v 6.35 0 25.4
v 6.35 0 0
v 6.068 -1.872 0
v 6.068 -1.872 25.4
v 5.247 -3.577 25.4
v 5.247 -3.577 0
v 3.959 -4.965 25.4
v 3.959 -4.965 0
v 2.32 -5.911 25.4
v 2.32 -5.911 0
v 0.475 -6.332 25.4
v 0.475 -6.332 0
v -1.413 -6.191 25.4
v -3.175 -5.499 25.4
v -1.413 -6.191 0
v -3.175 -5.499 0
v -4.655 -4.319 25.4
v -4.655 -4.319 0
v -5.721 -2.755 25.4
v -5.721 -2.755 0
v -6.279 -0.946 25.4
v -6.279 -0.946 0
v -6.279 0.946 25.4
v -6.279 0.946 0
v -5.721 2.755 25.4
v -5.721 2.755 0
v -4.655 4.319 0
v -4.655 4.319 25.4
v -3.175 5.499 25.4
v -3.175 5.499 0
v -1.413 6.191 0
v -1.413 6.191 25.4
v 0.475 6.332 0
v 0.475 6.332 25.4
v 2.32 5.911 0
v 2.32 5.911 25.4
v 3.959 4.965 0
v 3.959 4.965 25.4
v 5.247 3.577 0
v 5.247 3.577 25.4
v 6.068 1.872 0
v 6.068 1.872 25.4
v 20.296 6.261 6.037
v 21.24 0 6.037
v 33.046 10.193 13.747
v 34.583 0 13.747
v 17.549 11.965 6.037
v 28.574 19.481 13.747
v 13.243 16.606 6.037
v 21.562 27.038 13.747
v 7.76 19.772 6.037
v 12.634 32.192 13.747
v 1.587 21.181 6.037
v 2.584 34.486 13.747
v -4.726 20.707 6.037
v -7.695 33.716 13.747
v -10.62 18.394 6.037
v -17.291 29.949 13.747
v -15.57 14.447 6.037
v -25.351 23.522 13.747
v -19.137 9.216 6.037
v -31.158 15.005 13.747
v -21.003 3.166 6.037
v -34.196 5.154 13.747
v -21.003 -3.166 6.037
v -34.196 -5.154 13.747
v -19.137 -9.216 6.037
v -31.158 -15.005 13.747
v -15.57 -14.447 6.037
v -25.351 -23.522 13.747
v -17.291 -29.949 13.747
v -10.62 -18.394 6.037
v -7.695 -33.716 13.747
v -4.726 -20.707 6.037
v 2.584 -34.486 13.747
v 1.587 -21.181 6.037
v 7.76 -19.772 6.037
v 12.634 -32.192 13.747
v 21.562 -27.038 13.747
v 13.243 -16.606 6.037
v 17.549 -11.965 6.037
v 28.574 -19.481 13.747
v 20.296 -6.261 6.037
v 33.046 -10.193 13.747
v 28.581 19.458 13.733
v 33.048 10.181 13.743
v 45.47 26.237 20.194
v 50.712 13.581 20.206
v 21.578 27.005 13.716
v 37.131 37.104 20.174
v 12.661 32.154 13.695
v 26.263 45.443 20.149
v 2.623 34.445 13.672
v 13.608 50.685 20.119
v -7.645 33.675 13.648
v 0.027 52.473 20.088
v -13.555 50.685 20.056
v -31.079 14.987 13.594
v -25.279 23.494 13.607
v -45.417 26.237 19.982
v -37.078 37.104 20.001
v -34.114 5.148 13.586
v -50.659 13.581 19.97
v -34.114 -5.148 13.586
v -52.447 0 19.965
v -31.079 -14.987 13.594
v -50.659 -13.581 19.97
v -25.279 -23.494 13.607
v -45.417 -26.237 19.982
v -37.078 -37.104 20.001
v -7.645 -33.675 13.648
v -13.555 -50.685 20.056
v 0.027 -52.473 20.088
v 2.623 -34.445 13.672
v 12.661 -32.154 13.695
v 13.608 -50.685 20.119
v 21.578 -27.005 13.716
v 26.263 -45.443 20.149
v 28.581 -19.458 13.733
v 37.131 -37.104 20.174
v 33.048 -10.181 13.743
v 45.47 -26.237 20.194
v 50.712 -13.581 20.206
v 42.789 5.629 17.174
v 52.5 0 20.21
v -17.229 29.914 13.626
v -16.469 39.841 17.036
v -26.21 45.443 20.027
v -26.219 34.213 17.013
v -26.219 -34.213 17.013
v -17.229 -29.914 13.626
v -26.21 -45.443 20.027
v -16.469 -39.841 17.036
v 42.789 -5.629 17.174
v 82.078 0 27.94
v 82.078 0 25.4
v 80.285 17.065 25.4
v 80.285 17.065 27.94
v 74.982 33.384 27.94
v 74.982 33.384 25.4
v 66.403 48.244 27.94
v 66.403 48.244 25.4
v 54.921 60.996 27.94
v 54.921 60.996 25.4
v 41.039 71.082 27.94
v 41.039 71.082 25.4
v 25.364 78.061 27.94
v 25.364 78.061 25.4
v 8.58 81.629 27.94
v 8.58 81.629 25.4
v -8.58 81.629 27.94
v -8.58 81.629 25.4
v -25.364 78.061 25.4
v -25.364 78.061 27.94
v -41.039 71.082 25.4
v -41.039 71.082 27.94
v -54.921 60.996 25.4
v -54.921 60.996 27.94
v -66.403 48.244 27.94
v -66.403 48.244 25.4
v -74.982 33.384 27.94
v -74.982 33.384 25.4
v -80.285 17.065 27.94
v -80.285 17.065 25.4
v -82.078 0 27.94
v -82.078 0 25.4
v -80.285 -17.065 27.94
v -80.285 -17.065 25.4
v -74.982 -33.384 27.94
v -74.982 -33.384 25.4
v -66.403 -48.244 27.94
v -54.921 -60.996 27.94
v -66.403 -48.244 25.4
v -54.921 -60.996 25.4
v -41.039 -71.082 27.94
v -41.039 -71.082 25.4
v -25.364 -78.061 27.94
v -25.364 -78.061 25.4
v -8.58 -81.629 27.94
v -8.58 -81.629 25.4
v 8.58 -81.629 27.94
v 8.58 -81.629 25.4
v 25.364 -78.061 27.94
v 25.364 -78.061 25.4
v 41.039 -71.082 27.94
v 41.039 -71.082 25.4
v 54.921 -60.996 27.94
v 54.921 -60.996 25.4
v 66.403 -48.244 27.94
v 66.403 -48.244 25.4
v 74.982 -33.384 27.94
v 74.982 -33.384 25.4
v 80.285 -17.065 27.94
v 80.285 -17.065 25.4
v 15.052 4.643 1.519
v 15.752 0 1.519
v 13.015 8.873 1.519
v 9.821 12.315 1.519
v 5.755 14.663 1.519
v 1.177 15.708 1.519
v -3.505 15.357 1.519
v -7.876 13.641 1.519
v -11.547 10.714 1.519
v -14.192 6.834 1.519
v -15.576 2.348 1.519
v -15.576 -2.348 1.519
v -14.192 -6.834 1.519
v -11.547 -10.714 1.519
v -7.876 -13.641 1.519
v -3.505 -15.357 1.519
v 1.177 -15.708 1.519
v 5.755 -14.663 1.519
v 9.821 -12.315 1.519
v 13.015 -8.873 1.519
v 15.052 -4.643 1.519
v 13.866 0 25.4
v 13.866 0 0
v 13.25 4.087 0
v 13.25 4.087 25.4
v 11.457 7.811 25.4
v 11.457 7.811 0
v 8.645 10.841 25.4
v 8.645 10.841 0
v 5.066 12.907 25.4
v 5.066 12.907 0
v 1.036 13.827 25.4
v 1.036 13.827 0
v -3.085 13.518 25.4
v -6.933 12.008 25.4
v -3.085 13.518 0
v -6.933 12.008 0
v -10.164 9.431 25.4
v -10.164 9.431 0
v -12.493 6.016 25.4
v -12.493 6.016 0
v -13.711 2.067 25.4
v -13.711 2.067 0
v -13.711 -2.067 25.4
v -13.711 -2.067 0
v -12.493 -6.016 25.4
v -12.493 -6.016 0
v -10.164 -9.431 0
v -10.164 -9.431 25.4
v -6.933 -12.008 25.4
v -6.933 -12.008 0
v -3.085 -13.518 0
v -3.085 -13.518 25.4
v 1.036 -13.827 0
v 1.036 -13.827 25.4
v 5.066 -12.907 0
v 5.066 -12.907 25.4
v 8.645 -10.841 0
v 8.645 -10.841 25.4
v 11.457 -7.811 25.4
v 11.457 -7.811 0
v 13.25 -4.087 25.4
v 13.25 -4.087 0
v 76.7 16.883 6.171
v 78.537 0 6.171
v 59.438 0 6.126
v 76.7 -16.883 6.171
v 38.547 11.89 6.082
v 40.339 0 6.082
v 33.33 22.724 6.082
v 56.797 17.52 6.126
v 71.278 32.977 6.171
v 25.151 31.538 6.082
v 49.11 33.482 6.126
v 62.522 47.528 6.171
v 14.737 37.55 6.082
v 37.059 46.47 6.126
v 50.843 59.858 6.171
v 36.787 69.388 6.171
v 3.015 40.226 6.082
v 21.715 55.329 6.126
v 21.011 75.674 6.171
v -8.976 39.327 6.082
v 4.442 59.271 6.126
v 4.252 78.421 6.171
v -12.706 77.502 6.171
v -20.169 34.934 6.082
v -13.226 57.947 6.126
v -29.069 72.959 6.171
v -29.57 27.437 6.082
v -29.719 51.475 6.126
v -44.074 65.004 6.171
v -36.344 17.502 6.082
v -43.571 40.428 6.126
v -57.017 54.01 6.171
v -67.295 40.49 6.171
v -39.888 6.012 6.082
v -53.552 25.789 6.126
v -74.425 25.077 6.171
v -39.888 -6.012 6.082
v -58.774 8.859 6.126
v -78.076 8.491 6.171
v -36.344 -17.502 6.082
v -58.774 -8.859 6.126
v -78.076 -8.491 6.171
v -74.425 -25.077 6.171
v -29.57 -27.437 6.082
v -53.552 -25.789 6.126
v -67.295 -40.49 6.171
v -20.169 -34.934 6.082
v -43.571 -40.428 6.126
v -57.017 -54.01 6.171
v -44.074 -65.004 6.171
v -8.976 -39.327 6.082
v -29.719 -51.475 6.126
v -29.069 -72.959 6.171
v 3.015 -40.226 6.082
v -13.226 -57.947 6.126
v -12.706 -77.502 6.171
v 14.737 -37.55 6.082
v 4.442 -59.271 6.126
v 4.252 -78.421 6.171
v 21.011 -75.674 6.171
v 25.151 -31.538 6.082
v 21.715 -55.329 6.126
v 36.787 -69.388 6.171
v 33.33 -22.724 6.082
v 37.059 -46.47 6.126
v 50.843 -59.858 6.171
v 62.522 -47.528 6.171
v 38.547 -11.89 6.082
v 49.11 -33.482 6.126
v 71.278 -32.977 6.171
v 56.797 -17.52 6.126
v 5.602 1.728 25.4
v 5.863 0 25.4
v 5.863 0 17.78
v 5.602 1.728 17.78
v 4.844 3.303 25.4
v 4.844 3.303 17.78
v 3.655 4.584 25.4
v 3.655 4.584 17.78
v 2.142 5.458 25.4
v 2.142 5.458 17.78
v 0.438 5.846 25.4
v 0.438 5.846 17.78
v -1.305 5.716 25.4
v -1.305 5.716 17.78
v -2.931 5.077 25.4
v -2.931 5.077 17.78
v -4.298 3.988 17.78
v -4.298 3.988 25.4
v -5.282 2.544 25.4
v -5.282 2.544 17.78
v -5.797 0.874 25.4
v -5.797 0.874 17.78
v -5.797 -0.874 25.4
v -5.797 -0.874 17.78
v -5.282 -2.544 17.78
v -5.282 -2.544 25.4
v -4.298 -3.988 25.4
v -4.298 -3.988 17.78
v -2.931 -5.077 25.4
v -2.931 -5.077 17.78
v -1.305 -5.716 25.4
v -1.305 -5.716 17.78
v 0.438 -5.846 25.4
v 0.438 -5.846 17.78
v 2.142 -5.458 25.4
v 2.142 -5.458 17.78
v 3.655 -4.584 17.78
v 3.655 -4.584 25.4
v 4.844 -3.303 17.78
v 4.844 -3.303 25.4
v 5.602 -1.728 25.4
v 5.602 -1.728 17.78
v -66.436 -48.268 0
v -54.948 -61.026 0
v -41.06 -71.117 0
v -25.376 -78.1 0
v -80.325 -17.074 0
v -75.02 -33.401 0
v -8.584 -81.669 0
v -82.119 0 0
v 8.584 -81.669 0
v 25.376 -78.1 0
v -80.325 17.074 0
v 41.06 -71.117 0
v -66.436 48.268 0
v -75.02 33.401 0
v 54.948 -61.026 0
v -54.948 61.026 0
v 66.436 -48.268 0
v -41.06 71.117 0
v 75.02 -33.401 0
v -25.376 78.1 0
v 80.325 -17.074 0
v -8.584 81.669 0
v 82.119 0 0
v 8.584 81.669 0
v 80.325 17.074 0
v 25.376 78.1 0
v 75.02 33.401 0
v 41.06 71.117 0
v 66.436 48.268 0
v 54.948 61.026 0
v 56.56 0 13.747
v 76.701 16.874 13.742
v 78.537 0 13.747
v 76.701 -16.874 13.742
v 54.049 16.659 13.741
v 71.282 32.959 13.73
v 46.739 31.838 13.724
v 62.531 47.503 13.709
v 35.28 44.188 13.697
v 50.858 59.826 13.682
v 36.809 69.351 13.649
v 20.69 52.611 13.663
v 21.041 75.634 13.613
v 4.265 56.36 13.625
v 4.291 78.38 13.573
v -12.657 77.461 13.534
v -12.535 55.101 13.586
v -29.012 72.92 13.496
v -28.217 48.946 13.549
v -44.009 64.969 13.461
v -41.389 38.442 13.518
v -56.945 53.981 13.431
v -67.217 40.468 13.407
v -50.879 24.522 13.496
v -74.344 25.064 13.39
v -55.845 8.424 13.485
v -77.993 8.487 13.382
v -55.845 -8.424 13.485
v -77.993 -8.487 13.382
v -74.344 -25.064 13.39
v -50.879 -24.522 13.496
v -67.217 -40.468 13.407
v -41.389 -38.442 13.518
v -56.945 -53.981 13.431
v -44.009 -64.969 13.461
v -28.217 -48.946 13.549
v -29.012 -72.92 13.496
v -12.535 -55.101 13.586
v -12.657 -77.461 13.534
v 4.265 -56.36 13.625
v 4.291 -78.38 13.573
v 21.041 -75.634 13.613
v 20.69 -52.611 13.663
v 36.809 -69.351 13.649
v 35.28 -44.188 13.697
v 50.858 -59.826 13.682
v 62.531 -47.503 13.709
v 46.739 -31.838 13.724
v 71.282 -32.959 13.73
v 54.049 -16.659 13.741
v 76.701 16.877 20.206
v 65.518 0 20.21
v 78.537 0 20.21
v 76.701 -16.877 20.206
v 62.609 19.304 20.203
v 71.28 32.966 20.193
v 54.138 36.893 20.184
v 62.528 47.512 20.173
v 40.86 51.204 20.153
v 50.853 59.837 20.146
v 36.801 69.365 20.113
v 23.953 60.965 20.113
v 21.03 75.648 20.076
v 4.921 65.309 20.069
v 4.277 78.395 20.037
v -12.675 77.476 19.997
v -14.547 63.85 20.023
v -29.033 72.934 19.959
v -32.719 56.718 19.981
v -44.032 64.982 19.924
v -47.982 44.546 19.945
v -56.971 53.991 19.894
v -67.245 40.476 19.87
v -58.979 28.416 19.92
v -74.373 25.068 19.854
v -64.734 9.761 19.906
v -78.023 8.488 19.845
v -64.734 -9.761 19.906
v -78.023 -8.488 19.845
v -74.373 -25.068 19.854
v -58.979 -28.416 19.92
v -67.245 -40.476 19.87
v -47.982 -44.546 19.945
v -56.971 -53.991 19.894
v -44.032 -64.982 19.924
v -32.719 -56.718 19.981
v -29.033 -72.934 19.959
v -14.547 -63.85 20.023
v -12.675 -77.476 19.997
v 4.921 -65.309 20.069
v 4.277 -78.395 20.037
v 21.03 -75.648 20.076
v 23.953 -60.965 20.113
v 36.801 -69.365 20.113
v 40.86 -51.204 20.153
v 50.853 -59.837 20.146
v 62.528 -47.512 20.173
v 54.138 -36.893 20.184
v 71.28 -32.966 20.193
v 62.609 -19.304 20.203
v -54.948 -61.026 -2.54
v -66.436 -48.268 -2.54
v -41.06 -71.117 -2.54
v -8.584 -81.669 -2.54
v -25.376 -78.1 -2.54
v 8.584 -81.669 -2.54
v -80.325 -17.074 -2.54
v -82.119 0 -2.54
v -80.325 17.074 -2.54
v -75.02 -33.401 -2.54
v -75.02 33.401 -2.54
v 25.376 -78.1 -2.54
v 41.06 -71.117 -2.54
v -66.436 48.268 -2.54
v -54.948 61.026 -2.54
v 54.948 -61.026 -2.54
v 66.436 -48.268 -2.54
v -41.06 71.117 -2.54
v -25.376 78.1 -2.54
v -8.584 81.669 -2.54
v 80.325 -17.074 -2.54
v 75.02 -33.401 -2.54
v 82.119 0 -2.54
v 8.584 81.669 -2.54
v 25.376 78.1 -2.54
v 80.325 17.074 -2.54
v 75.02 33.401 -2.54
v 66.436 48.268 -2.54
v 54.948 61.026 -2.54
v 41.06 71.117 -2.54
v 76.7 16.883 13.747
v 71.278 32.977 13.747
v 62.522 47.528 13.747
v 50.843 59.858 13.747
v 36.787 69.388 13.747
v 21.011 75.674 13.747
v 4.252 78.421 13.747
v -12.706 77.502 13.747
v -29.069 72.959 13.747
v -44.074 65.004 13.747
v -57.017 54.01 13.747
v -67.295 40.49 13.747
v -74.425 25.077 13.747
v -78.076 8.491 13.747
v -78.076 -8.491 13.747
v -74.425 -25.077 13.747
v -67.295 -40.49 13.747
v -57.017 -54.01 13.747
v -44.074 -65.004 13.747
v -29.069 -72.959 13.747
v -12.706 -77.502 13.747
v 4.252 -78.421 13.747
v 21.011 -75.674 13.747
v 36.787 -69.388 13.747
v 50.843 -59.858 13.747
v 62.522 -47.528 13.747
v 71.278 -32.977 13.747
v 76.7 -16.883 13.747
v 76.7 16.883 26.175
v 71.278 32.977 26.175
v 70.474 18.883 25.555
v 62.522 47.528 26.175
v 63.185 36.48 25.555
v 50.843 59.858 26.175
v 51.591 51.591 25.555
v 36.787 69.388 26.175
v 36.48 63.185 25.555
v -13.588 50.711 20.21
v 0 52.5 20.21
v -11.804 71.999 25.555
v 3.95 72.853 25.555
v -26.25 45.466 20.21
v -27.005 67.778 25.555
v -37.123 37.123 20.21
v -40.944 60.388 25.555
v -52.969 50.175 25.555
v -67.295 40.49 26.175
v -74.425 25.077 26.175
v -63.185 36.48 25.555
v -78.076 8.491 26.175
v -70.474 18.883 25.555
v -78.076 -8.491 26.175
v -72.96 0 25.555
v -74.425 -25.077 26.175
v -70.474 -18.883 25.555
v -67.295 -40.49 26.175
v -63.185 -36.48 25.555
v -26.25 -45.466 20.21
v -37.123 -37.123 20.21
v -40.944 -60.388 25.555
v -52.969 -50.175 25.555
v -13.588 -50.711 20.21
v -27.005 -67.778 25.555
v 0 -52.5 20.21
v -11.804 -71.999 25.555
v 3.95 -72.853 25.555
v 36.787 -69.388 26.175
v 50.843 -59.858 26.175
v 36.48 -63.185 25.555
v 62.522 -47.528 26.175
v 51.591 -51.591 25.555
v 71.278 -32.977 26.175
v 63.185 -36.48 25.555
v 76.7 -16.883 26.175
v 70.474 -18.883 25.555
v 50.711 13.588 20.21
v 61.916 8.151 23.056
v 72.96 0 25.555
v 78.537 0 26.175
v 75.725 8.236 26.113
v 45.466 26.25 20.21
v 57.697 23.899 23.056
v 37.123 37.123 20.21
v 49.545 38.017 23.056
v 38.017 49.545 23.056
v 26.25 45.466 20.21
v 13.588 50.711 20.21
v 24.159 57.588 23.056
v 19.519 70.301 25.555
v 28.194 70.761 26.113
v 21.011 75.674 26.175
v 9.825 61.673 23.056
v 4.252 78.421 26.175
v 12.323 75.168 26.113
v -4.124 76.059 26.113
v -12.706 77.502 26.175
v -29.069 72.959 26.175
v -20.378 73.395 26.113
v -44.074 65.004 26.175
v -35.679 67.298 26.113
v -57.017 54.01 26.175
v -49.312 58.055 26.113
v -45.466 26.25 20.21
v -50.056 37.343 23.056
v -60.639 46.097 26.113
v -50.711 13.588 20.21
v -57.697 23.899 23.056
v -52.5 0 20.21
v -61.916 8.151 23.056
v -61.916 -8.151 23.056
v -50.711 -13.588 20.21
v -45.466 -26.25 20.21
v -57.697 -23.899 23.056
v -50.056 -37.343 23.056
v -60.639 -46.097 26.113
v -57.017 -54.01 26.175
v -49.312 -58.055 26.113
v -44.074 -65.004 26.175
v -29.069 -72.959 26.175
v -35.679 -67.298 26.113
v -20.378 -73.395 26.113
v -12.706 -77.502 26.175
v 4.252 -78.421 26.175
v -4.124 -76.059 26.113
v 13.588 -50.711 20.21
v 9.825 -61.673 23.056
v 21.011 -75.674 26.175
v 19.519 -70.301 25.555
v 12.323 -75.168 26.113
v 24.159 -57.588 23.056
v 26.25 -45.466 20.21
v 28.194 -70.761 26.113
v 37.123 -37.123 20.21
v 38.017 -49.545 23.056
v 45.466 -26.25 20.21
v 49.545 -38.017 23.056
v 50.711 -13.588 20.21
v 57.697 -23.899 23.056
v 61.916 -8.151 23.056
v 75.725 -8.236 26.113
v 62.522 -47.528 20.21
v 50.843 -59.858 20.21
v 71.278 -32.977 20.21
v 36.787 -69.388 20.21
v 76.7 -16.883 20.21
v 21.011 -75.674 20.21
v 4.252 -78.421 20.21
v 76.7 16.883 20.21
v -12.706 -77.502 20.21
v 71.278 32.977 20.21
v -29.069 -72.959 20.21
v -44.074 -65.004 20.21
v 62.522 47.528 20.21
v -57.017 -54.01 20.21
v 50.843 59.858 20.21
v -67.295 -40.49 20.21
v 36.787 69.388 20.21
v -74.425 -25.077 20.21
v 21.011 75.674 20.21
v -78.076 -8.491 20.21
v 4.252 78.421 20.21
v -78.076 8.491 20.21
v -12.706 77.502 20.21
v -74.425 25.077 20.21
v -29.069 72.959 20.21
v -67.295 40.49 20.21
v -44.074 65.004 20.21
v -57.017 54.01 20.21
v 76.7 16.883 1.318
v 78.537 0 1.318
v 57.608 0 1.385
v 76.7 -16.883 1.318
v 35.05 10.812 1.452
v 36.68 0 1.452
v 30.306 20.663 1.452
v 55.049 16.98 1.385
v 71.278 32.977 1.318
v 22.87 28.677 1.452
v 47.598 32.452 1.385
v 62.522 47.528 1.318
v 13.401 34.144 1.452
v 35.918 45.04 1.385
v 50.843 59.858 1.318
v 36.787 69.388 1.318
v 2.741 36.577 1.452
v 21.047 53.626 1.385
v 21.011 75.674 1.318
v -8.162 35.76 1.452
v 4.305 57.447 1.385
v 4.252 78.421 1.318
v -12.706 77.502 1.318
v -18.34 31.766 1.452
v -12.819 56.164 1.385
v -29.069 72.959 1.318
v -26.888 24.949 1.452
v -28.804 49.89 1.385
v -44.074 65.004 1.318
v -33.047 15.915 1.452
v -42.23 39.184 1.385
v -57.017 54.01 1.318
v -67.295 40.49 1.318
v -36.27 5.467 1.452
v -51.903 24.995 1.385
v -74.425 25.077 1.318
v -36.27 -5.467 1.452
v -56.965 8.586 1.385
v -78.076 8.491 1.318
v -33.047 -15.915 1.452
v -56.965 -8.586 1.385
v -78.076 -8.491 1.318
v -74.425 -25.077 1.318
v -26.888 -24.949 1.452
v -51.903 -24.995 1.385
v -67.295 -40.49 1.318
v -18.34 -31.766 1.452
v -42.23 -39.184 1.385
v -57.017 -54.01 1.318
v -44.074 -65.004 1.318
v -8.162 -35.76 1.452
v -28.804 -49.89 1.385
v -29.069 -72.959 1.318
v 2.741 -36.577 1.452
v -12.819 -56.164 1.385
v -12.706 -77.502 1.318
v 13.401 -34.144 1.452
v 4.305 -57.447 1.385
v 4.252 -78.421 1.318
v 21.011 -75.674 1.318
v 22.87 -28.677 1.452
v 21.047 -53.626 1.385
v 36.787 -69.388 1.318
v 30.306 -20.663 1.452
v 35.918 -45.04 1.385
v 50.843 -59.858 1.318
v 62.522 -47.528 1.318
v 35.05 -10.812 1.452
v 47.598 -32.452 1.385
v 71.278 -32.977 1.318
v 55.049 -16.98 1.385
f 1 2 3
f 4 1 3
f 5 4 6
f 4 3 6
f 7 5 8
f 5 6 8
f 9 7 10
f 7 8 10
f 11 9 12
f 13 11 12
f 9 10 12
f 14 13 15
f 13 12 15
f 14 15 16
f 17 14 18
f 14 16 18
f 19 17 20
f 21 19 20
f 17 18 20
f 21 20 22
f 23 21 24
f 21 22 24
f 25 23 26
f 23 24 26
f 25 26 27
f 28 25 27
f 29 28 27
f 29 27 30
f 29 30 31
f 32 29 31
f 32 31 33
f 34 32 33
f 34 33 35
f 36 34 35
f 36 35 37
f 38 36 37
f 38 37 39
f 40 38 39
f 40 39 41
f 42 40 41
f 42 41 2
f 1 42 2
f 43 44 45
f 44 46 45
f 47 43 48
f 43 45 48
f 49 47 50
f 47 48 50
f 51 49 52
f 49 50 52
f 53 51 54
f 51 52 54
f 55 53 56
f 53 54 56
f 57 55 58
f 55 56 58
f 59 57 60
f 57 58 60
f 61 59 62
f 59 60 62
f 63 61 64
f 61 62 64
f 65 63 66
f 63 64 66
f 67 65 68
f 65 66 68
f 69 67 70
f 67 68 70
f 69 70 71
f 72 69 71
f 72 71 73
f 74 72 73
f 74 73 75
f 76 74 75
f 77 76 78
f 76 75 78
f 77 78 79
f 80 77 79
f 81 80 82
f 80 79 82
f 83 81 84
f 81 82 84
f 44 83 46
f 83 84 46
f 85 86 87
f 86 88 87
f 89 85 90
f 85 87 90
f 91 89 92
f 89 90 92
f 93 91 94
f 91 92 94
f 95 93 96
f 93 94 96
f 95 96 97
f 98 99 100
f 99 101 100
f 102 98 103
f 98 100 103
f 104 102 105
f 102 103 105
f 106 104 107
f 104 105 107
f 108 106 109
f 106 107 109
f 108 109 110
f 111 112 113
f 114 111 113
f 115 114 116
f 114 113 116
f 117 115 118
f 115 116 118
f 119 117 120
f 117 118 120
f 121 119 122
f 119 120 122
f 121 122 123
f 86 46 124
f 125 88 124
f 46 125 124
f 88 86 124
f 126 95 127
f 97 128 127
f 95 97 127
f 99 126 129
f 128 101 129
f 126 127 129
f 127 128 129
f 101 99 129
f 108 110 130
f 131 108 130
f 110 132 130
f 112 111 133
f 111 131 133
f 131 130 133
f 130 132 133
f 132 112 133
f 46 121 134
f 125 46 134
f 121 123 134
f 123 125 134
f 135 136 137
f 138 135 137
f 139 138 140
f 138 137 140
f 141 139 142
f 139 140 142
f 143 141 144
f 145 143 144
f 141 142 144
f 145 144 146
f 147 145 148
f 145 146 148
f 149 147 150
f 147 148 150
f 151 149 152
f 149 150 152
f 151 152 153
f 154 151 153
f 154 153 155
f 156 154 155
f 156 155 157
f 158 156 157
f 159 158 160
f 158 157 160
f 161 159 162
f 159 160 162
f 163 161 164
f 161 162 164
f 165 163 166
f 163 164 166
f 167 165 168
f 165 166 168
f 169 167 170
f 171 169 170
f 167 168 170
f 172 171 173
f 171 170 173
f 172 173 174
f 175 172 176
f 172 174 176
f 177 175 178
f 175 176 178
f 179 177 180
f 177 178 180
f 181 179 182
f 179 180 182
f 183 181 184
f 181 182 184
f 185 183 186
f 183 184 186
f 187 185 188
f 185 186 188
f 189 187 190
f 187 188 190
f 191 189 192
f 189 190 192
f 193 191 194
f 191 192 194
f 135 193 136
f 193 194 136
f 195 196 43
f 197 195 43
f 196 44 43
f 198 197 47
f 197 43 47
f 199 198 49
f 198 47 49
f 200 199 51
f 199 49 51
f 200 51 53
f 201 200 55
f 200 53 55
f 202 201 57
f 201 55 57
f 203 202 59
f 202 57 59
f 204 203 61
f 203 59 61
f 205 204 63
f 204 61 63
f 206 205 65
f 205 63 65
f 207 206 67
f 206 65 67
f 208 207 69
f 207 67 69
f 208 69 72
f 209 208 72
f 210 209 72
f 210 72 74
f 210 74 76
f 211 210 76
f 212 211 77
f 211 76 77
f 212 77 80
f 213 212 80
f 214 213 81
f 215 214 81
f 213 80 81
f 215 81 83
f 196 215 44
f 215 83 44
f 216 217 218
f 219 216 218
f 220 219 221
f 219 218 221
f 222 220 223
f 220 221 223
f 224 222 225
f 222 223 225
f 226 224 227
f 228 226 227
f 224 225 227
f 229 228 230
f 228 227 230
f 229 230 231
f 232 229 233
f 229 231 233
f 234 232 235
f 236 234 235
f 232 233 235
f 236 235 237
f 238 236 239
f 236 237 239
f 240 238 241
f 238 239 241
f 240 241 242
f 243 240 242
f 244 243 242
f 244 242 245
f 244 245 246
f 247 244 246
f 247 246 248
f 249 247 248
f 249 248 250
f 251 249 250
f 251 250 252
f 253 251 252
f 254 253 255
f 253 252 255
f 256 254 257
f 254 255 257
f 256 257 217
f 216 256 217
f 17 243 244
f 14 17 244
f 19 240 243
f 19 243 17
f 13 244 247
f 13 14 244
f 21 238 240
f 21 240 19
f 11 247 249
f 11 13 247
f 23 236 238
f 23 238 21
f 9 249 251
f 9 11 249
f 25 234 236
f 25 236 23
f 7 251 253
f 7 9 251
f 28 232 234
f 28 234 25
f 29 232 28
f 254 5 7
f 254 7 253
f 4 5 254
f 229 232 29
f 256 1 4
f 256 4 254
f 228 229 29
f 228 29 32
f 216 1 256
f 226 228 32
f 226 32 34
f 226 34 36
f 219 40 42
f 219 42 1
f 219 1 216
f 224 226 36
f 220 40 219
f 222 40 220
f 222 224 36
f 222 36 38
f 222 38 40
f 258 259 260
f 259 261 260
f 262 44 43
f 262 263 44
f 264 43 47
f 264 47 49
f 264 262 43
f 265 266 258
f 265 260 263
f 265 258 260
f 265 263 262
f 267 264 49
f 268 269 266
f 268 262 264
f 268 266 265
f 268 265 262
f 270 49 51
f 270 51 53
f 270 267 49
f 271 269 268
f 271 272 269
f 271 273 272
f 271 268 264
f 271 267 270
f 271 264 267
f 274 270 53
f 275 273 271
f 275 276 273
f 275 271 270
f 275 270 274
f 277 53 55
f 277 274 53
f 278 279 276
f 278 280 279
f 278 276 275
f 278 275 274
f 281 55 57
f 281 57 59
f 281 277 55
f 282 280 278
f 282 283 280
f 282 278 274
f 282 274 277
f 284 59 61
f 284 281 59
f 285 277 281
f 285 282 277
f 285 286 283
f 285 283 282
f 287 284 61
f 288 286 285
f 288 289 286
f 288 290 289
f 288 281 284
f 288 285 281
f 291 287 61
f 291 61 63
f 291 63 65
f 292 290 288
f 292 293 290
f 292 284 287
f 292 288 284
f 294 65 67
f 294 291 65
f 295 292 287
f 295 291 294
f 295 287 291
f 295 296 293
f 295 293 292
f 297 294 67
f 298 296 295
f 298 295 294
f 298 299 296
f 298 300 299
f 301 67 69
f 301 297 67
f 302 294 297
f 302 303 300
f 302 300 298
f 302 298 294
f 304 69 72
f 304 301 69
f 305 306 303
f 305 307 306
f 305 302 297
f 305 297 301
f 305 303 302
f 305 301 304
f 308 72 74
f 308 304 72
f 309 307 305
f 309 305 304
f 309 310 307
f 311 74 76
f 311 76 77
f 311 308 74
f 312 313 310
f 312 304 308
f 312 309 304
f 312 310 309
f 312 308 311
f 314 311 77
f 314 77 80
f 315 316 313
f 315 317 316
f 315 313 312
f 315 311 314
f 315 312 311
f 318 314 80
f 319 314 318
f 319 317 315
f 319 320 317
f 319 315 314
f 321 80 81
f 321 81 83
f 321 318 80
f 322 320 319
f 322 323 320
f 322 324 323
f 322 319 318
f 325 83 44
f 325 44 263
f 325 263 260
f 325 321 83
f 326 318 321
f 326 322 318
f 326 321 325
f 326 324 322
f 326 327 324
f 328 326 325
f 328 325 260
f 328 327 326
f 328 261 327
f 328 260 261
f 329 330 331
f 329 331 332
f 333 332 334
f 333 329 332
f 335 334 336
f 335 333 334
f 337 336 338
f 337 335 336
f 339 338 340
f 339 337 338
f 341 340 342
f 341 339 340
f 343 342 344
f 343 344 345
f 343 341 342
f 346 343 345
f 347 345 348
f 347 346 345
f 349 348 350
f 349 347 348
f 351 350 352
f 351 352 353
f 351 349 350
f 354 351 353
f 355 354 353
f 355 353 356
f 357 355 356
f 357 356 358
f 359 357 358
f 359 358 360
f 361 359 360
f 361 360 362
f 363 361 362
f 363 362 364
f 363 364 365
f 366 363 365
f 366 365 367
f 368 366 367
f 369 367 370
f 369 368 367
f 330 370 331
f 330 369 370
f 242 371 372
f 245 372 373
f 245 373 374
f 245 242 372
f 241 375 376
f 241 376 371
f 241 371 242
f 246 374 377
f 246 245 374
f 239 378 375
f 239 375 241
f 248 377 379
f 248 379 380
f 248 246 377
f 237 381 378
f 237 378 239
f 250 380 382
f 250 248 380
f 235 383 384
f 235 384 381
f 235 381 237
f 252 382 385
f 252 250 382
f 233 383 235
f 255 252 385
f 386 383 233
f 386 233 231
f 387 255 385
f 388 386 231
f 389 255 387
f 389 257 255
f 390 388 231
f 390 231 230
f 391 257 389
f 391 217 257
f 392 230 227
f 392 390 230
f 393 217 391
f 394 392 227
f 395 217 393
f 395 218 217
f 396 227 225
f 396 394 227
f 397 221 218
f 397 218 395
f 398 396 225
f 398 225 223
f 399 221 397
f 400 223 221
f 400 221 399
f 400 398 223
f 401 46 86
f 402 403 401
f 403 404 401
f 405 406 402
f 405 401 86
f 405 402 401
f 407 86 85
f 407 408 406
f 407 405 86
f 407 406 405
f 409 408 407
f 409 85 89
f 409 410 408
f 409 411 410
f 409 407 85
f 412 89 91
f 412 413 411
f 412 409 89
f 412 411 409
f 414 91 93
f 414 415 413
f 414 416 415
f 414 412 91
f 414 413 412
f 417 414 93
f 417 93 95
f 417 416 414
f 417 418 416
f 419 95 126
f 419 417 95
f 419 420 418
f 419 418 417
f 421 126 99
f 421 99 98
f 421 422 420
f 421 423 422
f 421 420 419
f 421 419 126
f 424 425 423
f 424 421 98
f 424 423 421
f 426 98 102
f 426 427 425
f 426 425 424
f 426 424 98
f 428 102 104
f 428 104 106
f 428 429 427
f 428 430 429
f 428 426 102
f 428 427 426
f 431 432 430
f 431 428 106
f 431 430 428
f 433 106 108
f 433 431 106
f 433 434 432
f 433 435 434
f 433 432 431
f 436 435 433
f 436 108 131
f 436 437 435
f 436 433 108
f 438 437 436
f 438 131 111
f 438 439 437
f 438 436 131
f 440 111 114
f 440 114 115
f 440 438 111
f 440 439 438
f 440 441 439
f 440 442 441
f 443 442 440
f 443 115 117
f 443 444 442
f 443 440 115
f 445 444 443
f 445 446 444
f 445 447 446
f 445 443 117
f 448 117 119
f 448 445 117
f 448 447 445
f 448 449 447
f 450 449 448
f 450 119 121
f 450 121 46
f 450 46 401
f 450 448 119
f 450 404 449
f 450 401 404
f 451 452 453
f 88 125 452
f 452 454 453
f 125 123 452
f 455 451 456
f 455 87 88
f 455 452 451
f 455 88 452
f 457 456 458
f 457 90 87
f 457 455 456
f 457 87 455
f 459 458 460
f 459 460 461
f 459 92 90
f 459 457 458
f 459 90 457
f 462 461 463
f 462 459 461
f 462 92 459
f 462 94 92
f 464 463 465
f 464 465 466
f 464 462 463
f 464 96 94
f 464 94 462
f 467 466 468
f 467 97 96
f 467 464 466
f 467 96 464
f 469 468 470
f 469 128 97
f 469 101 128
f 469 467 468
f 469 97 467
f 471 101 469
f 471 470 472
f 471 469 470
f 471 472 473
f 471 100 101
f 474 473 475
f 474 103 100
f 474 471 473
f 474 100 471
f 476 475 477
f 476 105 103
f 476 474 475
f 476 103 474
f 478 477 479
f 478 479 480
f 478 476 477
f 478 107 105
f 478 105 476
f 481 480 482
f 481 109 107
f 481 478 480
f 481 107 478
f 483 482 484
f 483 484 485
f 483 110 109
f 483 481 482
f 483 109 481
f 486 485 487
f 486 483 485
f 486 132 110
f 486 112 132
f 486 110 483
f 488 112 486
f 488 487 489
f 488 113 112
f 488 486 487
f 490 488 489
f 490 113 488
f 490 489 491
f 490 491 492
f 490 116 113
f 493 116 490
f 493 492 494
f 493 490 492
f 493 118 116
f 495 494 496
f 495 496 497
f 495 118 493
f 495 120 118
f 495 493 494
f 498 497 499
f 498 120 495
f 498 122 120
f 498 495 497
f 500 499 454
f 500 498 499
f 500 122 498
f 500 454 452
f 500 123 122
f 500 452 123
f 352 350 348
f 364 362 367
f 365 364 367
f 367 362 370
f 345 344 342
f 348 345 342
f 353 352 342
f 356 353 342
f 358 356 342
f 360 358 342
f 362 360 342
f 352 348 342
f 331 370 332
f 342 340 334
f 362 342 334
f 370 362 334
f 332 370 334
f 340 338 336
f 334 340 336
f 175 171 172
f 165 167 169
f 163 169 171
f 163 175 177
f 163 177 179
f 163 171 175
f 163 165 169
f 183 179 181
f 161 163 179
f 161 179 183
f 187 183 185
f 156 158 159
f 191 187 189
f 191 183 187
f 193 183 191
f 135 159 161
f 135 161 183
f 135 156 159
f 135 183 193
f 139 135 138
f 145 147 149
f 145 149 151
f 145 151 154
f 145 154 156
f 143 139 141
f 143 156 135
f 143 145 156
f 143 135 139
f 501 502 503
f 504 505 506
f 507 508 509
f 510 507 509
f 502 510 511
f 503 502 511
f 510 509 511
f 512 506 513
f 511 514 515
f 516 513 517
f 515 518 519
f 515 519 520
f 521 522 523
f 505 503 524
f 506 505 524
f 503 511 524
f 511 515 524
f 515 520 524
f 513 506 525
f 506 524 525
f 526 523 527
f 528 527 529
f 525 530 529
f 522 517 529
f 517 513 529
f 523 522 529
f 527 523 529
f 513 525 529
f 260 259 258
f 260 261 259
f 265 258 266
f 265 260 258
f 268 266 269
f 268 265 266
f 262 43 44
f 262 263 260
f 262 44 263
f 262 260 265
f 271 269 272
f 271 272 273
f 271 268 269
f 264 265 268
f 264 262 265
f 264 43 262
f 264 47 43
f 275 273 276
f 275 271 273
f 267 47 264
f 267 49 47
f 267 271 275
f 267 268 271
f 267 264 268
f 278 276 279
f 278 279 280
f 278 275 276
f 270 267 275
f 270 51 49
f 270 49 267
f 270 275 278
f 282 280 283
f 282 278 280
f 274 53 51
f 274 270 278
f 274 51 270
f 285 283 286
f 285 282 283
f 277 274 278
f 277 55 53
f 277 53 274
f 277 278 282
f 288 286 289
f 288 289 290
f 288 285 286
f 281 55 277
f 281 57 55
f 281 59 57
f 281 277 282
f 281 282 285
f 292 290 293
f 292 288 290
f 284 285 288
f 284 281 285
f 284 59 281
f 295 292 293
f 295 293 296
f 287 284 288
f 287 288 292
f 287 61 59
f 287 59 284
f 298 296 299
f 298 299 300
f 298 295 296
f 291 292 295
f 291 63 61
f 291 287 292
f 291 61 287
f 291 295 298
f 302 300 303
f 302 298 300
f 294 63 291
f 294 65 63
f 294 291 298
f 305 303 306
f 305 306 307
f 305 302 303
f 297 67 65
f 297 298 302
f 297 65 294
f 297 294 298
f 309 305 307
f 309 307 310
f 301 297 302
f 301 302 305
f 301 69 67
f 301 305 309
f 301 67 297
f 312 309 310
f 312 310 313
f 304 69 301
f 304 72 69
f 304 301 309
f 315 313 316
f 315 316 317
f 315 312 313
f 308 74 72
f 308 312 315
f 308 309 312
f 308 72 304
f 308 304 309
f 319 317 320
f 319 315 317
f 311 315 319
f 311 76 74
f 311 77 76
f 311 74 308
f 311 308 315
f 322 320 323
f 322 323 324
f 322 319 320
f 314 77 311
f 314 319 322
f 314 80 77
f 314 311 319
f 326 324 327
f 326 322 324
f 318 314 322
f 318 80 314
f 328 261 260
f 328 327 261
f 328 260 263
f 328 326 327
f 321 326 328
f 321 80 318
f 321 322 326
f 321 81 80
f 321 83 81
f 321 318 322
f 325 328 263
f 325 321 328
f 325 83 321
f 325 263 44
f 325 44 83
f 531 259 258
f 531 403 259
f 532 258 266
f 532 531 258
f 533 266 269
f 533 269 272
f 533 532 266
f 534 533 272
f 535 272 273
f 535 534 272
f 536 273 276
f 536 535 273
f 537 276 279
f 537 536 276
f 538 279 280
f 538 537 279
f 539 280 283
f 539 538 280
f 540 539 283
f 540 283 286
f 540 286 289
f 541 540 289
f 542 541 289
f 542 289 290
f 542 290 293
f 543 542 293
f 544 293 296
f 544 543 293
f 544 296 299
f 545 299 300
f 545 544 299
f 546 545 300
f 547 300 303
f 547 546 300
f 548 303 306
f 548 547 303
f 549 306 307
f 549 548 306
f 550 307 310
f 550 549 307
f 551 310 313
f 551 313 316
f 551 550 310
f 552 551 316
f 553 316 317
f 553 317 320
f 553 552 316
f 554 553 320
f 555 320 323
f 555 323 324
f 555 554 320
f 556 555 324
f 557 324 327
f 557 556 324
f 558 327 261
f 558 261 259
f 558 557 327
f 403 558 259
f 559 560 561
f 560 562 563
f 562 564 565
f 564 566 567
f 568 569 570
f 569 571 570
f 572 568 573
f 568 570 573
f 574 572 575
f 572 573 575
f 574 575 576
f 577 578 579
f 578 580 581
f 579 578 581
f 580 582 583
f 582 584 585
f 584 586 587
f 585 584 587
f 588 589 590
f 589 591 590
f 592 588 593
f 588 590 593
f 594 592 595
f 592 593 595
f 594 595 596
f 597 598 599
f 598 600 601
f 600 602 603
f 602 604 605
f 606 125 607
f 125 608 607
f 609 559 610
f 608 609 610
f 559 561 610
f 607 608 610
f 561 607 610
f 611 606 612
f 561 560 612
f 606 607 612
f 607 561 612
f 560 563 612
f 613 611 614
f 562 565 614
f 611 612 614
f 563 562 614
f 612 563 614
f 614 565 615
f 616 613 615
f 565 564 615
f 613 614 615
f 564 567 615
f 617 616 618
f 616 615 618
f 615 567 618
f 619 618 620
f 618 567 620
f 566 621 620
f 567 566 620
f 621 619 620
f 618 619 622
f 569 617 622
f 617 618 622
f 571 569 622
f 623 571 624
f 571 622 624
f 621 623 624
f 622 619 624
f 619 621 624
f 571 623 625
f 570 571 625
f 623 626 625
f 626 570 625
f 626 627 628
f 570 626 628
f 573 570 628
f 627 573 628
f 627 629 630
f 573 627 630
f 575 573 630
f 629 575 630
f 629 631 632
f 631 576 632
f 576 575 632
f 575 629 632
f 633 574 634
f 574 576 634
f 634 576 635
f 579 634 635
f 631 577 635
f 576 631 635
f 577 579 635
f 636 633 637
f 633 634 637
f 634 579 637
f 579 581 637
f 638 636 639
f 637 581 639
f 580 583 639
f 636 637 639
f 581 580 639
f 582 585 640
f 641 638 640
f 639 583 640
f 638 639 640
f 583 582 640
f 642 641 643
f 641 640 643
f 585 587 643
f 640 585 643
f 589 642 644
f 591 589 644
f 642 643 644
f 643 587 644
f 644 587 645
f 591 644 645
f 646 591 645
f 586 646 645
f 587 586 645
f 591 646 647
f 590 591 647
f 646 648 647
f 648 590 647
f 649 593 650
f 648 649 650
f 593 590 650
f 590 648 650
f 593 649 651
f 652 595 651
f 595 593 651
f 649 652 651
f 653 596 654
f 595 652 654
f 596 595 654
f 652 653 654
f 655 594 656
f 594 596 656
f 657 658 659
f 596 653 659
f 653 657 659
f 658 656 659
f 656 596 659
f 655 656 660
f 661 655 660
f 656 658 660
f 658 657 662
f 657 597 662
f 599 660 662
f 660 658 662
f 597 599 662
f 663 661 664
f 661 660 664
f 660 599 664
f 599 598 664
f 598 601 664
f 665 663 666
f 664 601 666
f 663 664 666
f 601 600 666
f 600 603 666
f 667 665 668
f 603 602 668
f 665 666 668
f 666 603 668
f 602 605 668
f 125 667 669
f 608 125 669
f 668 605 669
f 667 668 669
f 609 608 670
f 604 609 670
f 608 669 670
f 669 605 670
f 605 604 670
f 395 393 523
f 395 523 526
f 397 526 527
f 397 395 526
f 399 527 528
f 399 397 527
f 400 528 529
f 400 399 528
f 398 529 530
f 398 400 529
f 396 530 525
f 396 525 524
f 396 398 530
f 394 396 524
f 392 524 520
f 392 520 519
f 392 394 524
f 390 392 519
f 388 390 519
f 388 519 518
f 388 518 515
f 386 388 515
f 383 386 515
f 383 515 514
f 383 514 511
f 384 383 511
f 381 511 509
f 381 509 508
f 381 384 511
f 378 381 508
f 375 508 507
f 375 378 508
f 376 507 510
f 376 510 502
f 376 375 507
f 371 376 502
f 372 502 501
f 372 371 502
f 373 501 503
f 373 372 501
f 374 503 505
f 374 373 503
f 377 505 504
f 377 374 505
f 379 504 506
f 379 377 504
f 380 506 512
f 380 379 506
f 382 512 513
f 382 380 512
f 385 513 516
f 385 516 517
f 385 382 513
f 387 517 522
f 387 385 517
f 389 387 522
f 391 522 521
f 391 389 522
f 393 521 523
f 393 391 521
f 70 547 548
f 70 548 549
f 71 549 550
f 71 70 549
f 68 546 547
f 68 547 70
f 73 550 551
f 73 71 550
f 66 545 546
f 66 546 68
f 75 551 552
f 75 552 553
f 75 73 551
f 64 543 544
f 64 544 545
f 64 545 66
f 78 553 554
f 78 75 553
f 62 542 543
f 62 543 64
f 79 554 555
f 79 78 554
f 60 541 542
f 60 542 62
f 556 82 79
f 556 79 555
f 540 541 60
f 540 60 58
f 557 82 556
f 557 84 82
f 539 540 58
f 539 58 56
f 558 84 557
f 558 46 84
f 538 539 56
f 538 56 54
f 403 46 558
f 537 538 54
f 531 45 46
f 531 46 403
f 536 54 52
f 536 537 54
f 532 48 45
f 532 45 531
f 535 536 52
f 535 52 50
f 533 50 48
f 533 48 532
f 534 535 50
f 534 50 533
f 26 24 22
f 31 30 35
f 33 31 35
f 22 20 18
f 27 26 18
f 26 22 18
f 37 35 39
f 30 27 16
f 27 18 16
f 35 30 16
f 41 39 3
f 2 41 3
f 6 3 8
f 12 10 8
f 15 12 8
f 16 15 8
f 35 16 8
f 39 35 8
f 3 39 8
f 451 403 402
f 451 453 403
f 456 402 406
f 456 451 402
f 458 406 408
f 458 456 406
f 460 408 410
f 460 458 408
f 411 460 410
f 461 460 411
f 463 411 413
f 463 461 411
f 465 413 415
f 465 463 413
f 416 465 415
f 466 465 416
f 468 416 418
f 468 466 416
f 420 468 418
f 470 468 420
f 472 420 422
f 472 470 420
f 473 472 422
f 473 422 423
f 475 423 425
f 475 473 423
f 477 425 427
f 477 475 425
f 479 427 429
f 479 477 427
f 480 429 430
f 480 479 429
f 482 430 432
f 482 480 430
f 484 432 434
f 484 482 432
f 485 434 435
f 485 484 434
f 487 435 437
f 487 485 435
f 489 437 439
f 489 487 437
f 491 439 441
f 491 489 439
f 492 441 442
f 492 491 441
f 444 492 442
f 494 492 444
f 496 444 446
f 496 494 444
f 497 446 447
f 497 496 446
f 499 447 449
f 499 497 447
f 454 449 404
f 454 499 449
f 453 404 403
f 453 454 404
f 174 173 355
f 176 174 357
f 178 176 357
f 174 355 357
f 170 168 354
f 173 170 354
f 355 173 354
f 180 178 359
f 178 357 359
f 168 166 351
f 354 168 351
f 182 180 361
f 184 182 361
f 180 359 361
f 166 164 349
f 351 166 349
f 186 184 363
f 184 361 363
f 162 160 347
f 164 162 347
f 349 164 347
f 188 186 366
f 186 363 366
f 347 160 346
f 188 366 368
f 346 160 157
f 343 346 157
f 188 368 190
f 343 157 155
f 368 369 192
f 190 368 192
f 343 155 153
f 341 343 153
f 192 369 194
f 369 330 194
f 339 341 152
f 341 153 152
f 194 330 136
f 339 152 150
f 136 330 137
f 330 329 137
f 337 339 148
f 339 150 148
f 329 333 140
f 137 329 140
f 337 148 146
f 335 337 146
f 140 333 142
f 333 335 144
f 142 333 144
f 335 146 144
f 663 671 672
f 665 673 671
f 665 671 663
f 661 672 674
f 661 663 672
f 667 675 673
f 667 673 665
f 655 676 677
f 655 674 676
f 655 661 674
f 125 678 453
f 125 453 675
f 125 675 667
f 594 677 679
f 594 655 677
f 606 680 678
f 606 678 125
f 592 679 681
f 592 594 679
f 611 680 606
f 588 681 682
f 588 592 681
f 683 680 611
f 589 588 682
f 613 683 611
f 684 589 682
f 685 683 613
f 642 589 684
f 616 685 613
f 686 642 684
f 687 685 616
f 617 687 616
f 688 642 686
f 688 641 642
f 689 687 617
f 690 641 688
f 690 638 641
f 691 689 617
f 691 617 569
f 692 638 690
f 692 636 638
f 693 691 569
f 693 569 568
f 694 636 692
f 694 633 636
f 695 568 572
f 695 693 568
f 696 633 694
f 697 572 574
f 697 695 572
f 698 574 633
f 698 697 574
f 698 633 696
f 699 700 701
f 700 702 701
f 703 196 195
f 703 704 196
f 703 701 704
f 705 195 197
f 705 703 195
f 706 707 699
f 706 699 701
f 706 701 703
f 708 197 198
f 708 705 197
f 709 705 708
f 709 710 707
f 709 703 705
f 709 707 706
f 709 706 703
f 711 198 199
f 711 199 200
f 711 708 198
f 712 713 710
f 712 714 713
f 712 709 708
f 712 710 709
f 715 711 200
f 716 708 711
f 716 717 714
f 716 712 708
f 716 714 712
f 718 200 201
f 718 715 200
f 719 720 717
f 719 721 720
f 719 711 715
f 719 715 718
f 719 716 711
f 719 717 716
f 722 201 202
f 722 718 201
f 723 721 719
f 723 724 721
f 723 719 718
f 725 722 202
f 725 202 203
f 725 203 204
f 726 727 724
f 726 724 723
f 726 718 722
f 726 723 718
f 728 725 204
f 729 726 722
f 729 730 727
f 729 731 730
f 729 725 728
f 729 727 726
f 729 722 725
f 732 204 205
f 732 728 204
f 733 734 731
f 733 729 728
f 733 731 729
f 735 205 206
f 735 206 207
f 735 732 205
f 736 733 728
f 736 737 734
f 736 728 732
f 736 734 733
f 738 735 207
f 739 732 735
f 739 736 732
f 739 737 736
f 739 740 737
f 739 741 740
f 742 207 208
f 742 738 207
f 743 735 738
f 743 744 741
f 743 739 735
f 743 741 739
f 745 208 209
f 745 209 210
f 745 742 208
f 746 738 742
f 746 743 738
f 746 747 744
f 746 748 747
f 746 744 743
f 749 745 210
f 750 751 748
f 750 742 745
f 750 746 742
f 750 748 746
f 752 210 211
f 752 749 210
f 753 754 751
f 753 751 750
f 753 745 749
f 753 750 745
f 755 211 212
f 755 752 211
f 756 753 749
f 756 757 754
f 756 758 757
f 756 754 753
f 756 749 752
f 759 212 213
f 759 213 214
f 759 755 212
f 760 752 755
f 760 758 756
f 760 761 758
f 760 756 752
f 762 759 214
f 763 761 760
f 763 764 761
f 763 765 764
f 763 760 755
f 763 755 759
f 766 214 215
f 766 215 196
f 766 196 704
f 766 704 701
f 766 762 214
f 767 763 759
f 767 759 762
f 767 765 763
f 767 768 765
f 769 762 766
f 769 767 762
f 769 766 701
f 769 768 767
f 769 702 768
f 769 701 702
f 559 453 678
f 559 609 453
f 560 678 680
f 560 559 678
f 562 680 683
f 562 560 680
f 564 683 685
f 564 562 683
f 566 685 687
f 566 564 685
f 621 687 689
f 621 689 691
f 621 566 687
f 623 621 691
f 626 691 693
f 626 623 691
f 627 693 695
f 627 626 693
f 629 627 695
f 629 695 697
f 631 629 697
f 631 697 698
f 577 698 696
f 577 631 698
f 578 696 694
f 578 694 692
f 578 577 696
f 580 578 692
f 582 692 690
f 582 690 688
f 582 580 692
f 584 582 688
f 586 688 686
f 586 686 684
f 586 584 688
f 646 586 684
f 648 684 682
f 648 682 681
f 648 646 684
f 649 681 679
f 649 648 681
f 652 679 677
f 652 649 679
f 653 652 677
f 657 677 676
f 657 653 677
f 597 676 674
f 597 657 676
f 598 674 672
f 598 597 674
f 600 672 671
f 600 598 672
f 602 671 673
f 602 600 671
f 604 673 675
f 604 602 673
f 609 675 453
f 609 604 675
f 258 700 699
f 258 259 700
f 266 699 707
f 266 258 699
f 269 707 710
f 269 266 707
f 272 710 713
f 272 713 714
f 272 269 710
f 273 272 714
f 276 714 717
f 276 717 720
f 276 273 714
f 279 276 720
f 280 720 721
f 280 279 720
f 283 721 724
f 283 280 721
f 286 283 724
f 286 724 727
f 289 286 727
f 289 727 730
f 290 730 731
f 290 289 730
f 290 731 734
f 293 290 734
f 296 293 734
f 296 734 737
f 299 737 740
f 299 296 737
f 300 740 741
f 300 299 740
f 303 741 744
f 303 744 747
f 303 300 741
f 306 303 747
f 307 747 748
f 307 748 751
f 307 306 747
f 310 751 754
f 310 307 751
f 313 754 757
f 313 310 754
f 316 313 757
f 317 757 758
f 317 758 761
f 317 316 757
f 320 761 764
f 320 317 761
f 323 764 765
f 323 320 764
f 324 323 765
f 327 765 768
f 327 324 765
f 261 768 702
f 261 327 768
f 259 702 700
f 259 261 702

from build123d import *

# Parameters (mm, degrees)
F5_R      = 82.1190752283
F5_R_2    = 13.4047383933
F6_DEPTH  = 2.54
F7_R      = 13.8659514691
F8_DEPTH  = 25.4
F10_D     = 12.7
F10_DEPTH = 25.401
F11_R     = 5.8628907245
F12_DEPTH = 7.62
F9_R      = 82.0782185387
F13_DEPTH = 2.54


with BuildPart() as f1:
    # F0 (on Front) → F1 (revolve)
    with BuildSketch(Plane.XZ):
        with BuildLine():
            add(Edge.make_bspline(
                [(15.7515468455, 1.5186385906), (16.2569814963, 1.959361021), (17.2846288696, 2.8554358099), (18.9526439694, 4.166854506), (20.3713483355, 5.3705503671), (21.0733665388, 5.9114203979), (21.2399935025, 6.0371666258)],
                knots=[0, 0, 0, 0, 0.0363510009, 0.0739086854, 0.112559803, 0.1251067413, 0.1251067413, 0.1251067413, 0.1251067413], degree=3))
            Line((15.7515468455, 1.5186385906), (78.5365324529, 1.318038129))
            Line((78.5365324529, 1.318038129), (78.5365324529, 6.1707655311))
            Line((78.5365324529, 6.1707655311), (21.2399935025, 6.0371666258))
        make_face()
    revolve(axis=Axis((0, 0, 16.4799756994), (0, 0, 1)))


with BuildPart() as f2:
    # F0 (on Front) → F2 (revolve)
    with BuildSketch(Plane.XZ):
        with BuildLine():
            add(Edge.make_bspline(
                [(21.2399935025, 6.0371666258), (21.5009112116, 6.234070038), (22.1342698046, 6.6949997973), (23.1310298936, 7.396516823), (24.8194929191, 8.4575455522), (25.7576037559, 9.2164833794), (29.1454642161, 11.0654940256), (31.8957072977, 12.37057363), (33.6465721386, 13.3169859548), (34.5826536048, 13.7466102251)],
                knots=[0.1251067413, 0.1251067413, 0.1251067413, 0.1251067413, 0.1447537319, 0.1753550601, 0.2105716651, 0.239375986, 0.2887628656, 0.3347946409, 0.3782386594, 0.3782386594, 0.3782386594, 0.3782386594], degree=3))
            Line((21.2399935025, 6.0371666258), (78.5365324529, 6.1707655311))
            Line((78.5365324529, 6.1707655311), (78.5365324529, 13.7466102251))
            Line((78.5365324529, 13.7466102251), (34.5826536048, 13.7466102251))
        make_face()
    revolve(axis=Axis((0, 0, 16.4799756994), (0, 0, 1)))


with BuildPart() as f3:
    # F0 (on Front) → F3 (revolve)
    with BuildSketch(Plane.XZ):
        with BuildLine():
            add(Edge.make_bspline(
                [(34.5826536048, 13.7466102251), (34.606915689, 13.7577455596), (35.6814873865, 14.2488728005), (38.048823558, 15.143884105), (41.4594226373, 16.4985573287), (45.4508659579, 18.1028686828), (49.3448973071, 19.2429844364), (51.5891441877, 19.9139420623), (52.4998004667, 20.2101180306)],
                knots=[0.3782386594, 0.3782386594, 0.3782386594, 0.3782386594, 0.3793646751, 0.4279916519, 0.4771807945, 0.5302968437, 0.5840070306, 0.6225372943, 0.6225372943, 0.6225372943, 0.6225372943], degree=3))
            Line((34.5826536048, 13.7466102251), (78.5365324529, 13.7466102251))
            Line((78.5365324529, 13.7466102251), (78.5365324529, 20.2101180306))
            Line((78.5365324529, 20.2101180306), (52.4998004667, 20.2101180306))
        make_face()
    revolve(axis=Axis((0.0349167788, 0, 16.4799756994), (-0.0023317035, 0, 0.9999972816)))


with BuildPart() as f4:
    # F0 (on Front) → F4 (revolve)
    with BuildSketch(Plane.XZ):
        with BuildLine():
            add(Edge.make_bspline(
                [(52.4998004667, 20.2101180306), (52.7666258691, 20.2968986017), (54.1648589641, 20.7628246645), (56.603471745, 21.7101812772), (60.2482012651, 22.3407375348), (62.771290046, 23.2311631143), (66.3751725962, 23.8129712703), (70.133277328, 24.8132282159), (73.3957067914, 25.7248775779), (76.803780903, 26.2492134197), (78.0301706551, 26.1968164211), (78.5365324529, 26.1751823212)],
                knots=[0.6225372943, 0.6225372943, 0.6225372943, 0.6225372943, 0.6338267932, 0.6822117186, 0.7308995857, 0.7727704857, 0.8213286443, 0.8719649813, 0.9198306396, 0.966899021, 1, 1, 1, 1], degree=3))
            Line((52.4998004667, 20.2101180306), (78.5365324529, 20.2101180306))
            Line((78.5365324529, 20.2101180306), (78.5365324529, 26.1751823212))
        make_face()
    revolve(axis=Axis((0, 0, 16.4799756994), (0, 0, 1)))


with BuildPart() as f6:
    # F5 (on Top) → F6 (new body)
    with BuildSketch(Plane.XY):
        Circle(F5_R)
        Circle(F5_R_2, mode=Mode.SUBTRACT)
        Circle(F5_R_2)
    extrude(amount=-F6_DEPTH)

    # F7 (on Top) → F8 (join)
    with BuildSketch(Plane.XY):
        Circle(F7_R)
    extrude(amount=F8_DEPTH)

    # F10 (through all, one way)
    with BuildSketch(Plane(origin=(0, 0, 0), x_dir=(1, 0, 0), z_dir=(0, 0, -1))):
        with Locations((0, 0)):
            Circle(F10_D / 2)
    extrude(amount=-F10_DEPTH, mode=Mode.SUBTRACT)


with BuildPart() as f12:
    # F11 (on face) → F12 (new body)
    with BuildSketch(Plane.XY.offset(25.4)):
        Circle(F11_R)
    extrude(amount=-F12_DEPTH)

    # F9 (on face) → F13 (join)
    with BuildSketch(Plane.XY.offset(25.4)):
        Circle(F9_R)
    extrude(amount=F13_DEPTH)


solid = Compound([f1.part, f2.part, f3.part, f4.part, f6.part, f12.part])
